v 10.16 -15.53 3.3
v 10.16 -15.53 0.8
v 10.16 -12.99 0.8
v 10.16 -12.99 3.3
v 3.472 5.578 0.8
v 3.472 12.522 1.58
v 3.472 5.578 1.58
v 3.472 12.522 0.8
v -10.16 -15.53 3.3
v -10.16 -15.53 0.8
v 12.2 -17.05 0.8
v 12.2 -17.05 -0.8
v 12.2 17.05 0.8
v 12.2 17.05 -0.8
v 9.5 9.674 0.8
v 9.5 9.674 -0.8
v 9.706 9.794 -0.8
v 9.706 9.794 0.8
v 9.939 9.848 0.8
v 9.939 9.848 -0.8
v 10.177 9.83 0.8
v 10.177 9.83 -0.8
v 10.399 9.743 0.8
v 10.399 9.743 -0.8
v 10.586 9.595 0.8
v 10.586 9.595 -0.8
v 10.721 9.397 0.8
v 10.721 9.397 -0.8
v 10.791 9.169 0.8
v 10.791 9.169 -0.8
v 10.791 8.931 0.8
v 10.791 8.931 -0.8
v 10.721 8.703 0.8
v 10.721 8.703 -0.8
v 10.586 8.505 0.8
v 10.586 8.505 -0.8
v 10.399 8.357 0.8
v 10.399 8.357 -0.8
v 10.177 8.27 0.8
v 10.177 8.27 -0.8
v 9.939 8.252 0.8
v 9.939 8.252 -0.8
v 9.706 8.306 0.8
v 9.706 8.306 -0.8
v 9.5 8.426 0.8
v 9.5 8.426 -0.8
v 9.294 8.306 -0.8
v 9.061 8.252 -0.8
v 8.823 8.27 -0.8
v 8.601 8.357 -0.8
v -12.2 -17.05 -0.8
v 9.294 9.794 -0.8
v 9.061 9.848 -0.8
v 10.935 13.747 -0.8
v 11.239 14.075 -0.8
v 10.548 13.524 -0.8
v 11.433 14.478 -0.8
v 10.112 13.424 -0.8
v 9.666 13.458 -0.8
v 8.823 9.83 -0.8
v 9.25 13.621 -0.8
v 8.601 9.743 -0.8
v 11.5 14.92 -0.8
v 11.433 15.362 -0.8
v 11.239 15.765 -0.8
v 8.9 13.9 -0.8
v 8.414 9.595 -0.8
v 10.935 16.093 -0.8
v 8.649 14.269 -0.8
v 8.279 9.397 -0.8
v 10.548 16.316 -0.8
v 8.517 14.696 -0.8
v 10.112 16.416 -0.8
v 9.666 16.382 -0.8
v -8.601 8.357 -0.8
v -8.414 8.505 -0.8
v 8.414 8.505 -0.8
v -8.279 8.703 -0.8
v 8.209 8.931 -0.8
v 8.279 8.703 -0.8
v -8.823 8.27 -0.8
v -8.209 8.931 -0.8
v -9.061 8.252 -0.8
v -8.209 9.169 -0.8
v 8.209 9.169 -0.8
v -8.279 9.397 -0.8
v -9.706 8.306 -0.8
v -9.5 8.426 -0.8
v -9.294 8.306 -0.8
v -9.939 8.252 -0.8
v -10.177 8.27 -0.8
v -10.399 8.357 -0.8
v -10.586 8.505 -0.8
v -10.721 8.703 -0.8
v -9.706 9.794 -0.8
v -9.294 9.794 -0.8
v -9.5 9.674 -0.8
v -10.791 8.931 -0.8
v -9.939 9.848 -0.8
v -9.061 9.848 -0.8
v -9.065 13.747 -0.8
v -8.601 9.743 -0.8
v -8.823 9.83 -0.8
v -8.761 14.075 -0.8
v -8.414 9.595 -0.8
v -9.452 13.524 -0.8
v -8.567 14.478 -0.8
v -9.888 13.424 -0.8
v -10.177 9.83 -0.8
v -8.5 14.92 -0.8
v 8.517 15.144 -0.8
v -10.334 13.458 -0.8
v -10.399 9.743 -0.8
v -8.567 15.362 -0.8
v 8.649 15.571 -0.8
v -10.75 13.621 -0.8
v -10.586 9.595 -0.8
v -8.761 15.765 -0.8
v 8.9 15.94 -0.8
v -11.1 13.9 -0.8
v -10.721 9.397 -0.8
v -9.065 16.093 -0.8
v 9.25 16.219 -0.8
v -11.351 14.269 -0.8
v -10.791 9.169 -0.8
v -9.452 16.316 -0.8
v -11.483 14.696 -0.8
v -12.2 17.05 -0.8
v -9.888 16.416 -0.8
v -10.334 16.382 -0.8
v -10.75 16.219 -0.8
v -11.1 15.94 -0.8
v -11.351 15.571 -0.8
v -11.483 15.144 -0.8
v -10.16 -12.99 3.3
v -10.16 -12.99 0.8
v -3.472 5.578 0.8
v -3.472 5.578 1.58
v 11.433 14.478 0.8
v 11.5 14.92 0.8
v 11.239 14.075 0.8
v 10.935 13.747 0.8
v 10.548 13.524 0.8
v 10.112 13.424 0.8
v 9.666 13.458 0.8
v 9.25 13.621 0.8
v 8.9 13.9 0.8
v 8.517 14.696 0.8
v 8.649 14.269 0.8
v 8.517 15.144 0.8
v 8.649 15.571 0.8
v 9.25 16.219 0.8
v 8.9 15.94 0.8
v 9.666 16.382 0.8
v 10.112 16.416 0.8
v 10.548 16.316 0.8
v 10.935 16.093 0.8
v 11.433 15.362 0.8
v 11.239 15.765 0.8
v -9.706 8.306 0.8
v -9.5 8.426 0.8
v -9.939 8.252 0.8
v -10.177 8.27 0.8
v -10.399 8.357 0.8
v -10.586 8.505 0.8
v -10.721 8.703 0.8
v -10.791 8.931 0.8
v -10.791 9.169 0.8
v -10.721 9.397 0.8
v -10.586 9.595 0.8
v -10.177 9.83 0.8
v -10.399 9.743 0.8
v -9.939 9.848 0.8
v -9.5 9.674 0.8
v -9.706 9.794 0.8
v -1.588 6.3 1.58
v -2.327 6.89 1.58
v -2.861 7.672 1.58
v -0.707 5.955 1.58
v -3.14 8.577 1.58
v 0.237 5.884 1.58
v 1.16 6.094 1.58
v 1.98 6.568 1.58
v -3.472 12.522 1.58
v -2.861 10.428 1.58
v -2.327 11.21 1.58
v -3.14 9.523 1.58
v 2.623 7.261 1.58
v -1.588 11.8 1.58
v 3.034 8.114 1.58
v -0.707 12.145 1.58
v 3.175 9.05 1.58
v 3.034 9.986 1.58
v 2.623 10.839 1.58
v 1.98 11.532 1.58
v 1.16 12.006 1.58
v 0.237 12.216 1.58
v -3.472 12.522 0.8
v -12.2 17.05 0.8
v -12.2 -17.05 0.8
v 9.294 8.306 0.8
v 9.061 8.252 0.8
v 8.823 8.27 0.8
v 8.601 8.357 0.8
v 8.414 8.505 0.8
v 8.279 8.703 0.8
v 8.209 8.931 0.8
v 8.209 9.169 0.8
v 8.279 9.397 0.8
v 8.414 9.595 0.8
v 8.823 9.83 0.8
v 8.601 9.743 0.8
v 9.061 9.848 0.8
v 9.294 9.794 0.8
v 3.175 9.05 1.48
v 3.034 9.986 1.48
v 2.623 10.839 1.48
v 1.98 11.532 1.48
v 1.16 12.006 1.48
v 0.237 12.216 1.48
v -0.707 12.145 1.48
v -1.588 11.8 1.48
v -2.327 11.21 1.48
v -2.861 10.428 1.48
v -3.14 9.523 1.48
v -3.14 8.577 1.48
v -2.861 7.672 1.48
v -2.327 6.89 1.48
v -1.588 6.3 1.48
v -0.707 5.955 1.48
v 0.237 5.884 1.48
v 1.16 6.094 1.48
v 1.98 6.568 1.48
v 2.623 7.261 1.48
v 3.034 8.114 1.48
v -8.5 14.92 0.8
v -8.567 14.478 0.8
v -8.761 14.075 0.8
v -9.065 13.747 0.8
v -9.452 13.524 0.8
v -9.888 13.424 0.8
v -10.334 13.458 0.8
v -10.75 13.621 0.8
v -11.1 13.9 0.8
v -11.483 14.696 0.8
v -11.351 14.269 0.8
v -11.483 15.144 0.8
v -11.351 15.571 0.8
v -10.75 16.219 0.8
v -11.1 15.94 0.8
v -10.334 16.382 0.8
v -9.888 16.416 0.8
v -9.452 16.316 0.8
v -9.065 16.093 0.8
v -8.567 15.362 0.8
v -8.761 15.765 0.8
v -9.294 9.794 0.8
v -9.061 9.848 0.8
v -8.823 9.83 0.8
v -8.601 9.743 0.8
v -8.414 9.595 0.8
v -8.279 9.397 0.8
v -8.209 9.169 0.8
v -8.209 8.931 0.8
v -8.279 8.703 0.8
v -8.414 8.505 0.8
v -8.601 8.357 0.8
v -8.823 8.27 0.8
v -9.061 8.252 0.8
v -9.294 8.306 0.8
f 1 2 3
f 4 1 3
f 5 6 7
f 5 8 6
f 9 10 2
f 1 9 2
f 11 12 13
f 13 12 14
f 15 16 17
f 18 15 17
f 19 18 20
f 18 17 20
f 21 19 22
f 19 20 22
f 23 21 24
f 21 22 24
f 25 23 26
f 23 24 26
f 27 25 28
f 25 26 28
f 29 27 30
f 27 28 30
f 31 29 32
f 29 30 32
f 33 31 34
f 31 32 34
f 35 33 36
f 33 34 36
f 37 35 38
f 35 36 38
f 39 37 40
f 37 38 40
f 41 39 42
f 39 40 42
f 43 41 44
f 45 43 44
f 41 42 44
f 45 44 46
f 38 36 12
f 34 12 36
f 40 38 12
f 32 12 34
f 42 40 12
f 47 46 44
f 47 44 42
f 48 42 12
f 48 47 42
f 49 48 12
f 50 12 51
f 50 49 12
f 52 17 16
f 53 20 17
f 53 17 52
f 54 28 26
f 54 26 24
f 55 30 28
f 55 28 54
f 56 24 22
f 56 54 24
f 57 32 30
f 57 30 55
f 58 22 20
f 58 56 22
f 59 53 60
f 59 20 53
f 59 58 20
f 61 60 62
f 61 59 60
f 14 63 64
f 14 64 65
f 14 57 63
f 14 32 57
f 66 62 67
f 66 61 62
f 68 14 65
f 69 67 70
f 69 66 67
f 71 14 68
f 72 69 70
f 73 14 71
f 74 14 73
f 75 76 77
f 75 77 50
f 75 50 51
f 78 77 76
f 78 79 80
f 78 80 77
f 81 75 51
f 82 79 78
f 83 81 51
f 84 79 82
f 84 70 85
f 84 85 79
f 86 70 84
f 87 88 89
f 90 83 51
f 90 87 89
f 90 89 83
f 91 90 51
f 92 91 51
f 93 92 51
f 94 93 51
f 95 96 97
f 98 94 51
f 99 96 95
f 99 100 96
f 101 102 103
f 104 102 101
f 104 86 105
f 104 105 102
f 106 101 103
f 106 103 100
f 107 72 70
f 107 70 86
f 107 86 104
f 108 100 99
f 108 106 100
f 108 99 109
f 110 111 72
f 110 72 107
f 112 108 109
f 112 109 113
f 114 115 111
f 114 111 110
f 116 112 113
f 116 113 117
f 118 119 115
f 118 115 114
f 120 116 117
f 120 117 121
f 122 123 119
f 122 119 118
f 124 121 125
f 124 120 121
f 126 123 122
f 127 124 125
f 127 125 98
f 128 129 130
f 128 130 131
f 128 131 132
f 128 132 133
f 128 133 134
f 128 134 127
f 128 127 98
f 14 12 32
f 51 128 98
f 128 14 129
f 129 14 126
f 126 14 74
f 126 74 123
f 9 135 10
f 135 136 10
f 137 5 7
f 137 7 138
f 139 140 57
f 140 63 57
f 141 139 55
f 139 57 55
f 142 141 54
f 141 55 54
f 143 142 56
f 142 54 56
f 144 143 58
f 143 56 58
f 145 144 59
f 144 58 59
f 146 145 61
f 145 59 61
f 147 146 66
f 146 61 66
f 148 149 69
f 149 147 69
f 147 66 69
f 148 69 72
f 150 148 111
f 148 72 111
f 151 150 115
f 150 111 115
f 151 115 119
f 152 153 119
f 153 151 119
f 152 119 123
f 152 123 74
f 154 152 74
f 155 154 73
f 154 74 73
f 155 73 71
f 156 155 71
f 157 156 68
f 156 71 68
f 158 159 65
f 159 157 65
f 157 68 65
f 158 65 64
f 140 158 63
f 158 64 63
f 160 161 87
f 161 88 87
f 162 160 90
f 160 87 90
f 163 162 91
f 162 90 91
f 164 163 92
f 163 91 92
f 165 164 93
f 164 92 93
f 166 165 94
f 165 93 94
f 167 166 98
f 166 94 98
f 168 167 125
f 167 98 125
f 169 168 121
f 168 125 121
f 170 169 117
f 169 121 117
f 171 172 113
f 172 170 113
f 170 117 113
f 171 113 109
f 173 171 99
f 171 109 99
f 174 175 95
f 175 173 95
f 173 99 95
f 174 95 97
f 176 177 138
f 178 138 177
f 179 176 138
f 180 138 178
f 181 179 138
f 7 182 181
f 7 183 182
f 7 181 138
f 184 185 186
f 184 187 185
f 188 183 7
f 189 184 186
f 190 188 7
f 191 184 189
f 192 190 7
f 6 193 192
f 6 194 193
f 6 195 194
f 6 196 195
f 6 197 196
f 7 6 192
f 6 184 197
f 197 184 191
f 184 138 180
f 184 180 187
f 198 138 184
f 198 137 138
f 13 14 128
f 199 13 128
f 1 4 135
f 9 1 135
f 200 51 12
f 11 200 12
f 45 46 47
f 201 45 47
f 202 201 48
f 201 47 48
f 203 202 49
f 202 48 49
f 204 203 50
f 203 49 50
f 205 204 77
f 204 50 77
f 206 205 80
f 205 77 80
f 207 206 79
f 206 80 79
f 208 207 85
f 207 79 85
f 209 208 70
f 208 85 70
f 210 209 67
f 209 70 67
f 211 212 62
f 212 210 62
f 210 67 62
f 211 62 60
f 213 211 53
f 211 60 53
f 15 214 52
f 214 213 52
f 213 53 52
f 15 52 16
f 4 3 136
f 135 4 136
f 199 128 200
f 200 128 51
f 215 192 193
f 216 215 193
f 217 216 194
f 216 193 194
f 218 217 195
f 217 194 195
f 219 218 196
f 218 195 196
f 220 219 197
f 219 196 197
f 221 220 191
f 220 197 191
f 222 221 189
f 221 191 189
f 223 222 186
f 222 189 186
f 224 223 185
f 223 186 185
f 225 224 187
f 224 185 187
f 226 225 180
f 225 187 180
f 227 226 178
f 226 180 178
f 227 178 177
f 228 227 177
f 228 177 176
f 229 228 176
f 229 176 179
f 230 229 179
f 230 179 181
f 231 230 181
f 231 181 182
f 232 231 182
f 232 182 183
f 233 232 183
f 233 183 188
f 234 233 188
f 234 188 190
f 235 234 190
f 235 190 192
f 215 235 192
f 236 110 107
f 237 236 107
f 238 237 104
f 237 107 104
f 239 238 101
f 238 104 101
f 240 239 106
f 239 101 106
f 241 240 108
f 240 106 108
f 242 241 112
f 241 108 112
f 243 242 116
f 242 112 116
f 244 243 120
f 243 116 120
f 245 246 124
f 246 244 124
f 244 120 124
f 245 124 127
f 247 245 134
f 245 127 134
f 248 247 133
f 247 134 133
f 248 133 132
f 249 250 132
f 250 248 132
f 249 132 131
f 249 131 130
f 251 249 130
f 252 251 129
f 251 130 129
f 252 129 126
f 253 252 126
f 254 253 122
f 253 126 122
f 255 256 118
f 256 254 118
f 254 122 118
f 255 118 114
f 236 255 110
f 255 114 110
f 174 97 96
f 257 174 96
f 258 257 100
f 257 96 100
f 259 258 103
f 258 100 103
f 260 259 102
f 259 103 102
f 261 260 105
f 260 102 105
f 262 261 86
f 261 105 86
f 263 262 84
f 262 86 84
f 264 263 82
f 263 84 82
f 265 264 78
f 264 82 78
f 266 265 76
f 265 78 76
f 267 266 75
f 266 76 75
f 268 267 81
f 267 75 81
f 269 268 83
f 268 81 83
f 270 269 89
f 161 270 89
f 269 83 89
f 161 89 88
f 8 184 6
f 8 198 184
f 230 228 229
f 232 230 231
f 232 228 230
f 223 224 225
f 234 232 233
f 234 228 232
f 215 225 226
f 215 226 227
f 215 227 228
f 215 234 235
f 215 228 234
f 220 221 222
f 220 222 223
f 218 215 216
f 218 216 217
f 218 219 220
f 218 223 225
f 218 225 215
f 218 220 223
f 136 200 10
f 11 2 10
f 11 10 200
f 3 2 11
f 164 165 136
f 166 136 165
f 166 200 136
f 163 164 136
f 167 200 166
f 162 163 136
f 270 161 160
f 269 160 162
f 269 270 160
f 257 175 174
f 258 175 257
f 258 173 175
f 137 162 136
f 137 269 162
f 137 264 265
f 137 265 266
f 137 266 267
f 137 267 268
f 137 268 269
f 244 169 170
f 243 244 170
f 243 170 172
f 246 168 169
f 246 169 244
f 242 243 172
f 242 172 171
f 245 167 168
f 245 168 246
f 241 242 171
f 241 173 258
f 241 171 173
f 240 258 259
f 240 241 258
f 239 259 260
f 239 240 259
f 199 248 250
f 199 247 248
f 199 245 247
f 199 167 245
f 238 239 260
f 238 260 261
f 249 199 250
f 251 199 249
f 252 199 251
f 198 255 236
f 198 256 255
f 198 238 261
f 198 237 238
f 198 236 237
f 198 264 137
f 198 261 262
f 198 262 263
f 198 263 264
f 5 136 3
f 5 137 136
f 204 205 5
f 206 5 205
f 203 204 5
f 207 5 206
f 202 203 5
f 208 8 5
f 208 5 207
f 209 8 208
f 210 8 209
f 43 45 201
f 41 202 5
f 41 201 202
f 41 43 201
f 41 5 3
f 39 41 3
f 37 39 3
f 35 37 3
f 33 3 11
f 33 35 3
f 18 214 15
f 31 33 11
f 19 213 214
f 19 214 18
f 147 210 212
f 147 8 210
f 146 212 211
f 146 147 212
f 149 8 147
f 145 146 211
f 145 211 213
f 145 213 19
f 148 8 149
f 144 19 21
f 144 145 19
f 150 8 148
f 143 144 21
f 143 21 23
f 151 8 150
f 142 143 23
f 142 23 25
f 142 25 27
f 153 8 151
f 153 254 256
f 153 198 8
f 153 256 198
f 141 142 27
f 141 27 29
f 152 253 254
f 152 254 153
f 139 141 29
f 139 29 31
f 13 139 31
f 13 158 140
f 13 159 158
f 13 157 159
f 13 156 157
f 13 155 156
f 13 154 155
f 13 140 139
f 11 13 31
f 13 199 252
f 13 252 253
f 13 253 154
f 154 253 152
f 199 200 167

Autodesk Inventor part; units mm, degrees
ref_plane "YZ Plane" through (0, 0, 0) normal (1, 0, 0) x (0, 1, 0)
ref_plane "XZ Plane" through (0, 0, 0) normal (0, 1, 0) x (-1, 0, 0)
ref_plane "XY Plane" through (0, 0, 0) normal (0, 0, 1) x (1, 0, 0)
sketch "Sketch1" plane through (0, 0, 0) normal (0, 0, 1) x (1, 0, 0)
  line L0 (-12.2, -17.05) -> (12.2, -17.05)
  line L1 (12.2, -17.05) -> (12.2, 17.05)
  line L2 (12.2, 17.05) -> (-12.2, 17.05)
  line L3 (-12.2, 17.05) -> (-12.2, -17.05)
  line L4 (-12.2, -17.05) -> (12.2, 17.05) construction
  line L5 (12.2, -17.05) -> (-12.2, 17.05) construction
  circle A0 centre (-10, 14.92) radius 1.5
  circle A1 centre (10, 14.92) radius 1.5
  line L6 (-10, 14.92) -> (10, 14.92) construction
  circle A2 centre (-9, 9.05) radius 0.8
  circle A3 centre (-10, 9.05) radius 0.8
  circle A4 centre (9, 9.05) radius 0.8
  circle A5 centre (10, 9.05) radius 0.8
  line L7 (-9, 9.05) -> (9, 9.05) construction
  line L8 (-10, 9.05) -> (10, 9.05) construction
  point P0 (0, 0)
  point P1 (0, 9.05)
  point P2 (0, 14.92)
  point P3 (0, 0)
  point P4 (0, 0)
  dimension "d0" = 24.4
  dimension "d1" = 34.1
  dimension "d2" = 2.13
  dimension "d3" = 3
  dimension "d4" = 10
  dimension "d13" = 20
  dimension "d14" = 18
  dimension "d15" = 1.6
  dimension "d16" = 8
extrude "Extrusion1" add sketch "Sketch1" along normal mid plane 1.6
sketch "Sketch2" plane through (0, 0, -0.8) normal (0, 0, -1) x (-1, 0, 0)
  circle A0 centre (-10, 14.92) radius 1.5 projected
  circle A1 centre (10, 14.92) radius 1.5 projected
  line L0 (-12.2, -17.05) -> (12.2, -17.05) projected
  line L1 (12.2, -17.05) -> (12.2, 17.05) projected
  line L2 (12.2, 17.05) -> (-12.2, 17.05) projected
  line L3 (-12.2, 17.05) -> (-12.2, -17.05) projected
  line L4 (-10.16, -12.99) -> (10.16, -12.99)
  line L5 (10.16, -12.99) -> (10.16, -15.53)
  line L6 (10.16, -15.53) -> (-10.16, -15.53)
  line L7 (-10.16, -15.53) -> (-10.16, -12.99)
  point P0 (0, 0)
  point P1 (0, -12.99)
  point P2 (-10.16, -14.26)
  dimension "d8" = 2.54
  dimension "d9" = 20.32
  dimension "d10" = 2.79
extrude "Extrusion2" add sketch "Sketch2" against normal blind 4.1 contours L4 L5 L6 L7
sketch "Sketch3" plane through (0, 0, 0.8) normal (0, 0, 1) x (1, 0, 0)
  circle A0 centre (10, 14.92) radius 1.5 projected
  circle A1 centre (-10, 14.92) radius 1.5 projected
  arc A2 (-9.5, 8.4255) -> (-9.5, 9.6745) centre (-9, 9.05) ccw projected
  arc A3 (-9.5, 9.6745) -> (-9.5, 8.4255) centre (-10, 9.05) ccw projected
  line L0 (-12.2, -17.05) -> (12.2, -17.05) projected
  line L1 (12.2, -17.05) -> (12.2, 17.05) projected
  line L2 (12.2, 17.05) -> (-12.2, 17.05) projected
  line L3 (-12.2, 17.05) -> (-12.2, -17.05) projected
  arc A4 (9.5, 9.6745) -> (9.5, 8.4255) centre (9, 9.05) ccw projected
  arc A5 (9.5, 8.4255) -> (9.5, 9.6745) centre (10, 9.05) ccw projected
  line L4 (-3.4725, 12.5225) -> (3.4725, 12.5225)
  line L5 (3.4725, 12.5225) -> (3.4725, 5.5775)
  line L6 (3.4725, 5.5775) -> (-3.4725, 5.5775)
  line L7 (-3.4725, 5.5775) -> (-3.4725, 12.5225)
  point P0 (0, 0)
  point P1 (3.4725, 9.05)
  point P2 (0, 12.5225)
  dimension "d17" = 6.945
extrude "Extrusion3" add sketch "Sketch3" along normal blind 0.78 contours L4 L5 L6 L7
sketch "Sketch4" plane through (0, 0, 1.58) normal (0, 0, 1) x (1, 0, 0)
  line L0 (3.4725, 12.5225) -> (-3.4725, 12.5225) projected
  line L1 (-3.4725, 12.5225) -> (-3.4725, 5.5775) projected
  line L2 (-3.4725, 5.5775) -> (3.4725, 5.5775) projected
  line L3 (3.4725, 5.5775) -> (3.4725, 12.5225) projected
  circle A0 centre (0, 9.05) radius 3.175
  point P0 (0, 0)
  point P1 (0, 12.5225)
  point P2 (-3.4725, 9.05)
  dimension "d20" = 6.35
extrude "Extrusion4" cut sketch "Sketch4" against normal blind 0.1 contours A0
equation "\"d9\" = 8 * d8"
properties part number "Module_ArducamMini-Rev" material "Epoxy Resin"
